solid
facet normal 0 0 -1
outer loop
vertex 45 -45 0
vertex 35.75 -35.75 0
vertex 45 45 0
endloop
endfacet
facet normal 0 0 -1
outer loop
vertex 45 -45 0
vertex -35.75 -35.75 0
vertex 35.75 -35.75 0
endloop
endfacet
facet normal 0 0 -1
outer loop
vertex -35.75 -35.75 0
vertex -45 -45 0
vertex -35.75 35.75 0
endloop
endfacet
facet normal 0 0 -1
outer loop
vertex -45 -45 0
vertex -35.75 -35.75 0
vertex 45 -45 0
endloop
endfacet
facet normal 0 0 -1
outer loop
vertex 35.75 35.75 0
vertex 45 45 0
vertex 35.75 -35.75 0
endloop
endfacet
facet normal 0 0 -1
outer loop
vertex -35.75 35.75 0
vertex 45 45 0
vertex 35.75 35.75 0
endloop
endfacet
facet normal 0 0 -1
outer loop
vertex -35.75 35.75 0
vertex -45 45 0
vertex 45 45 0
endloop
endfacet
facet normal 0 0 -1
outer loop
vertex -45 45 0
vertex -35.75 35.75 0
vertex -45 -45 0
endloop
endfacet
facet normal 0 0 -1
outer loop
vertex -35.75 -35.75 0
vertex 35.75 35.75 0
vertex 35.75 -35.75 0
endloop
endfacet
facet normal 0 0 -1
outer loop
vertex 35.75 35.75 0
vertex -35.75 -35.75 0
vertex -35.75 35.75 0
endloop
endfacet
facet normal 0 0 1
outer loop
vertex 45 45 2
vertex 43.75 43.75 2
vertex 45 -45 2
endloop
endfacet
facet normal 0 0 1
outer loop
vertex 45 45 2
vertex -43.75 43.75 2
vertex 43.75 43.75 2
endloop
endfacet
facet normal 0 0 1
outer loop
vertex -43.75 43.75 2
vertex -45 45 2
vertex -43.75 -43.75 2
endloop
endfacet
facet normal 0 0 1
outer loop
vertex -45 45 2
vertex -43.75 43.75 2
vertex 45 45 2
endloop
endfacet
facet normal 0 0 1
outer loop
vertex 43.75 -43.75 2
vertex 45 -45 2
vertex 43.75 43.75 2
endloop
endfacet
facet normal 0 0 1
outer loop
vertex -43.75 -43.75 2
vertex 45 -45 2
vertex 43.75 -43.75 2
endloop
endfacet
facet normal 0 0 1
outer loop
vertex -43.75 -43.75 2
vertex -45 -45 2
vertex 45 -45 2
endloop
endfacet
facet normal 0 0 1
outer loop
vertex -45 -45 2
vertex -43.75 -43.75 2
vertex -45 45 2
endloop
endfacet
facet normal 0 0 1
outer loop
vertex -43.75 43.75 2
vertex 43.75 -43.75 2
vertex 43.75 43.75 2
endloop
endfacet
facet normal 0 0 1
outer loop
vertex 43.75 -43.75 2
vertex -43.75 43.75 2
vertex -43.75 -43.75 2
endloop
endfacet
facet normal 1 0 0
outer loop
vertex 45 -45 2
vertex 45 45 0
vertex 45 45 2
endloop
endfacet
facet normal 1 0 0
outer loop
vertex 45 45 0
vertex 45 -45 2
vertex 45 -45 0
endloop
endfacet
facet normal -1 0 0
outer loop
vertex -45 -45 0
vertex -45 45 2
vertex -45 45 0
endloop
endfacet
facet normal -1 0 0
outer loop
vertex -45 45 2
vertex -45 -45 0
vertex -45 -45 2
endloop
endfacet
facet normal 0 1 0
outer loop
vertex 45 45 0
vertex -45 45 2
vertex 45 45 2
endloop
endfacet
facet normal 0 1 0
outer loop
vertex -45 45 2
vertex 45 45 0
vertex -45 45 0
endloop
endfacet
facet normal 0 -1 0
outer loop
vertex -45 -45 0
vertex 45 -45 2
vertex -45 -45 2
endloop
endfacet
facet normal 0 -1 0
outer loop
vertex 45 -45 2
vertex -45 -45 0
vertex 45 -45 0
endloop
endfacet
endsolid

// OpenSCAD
// Built by bench/smallmodels/features/compiler.py from a list of features.
$fn = 64;
difference() {
  union() {
    translate([0, 0, 0]) translate([-45, -45, 0]) cube([90, 90, 2]);
  }
  union() {
    translate([0, 0, -2]) rotate([0, 0, 0]) translate([-35.75, -35.75, 0]) cube([71.5, 71.5, 2]);
    translate([0, -135, 2]) rotate([0, 0, 0]) translate([-45, -1.25, 0]) cube([90, 2.5, 40]);
    translate([0, -45, 2]) rotate([0, 0, 0]) translate([-45, -1.25, 0]) cube([90, 2.5, 40]);
    translate([0, 45, 2]) rotate([0, 0, 0]) translate([-45, -1.25, 0]) cube([90, 2.5, 40]);
    translate([0, 135, 2]) rotate([0, 0, 0]) translate([-45, -1.25, 0]) cube([90, 2.5, 40]);
    translate([-135, 0, 2]) rotate([0, 0, 0]) translate([-1.25, -45, 0]) cube([2.5, 90, 40]);
    translate([-45, 0, 2]) rotate([0, 0, 0]) translate([-1.25, -45, 0]) cube([2.5, 90, 40]);
    translate([45, 0, 2]) rotate([0, 0, 0]) translate([-1.25, -45, 0]) cube([2.5, 90, 40]);
    translate([135, 0, 2]) rotate([0, 0, 0]) translate([-1.25, -45, 0]) cube([2.5, 90, 40]);
    translate([0, -135, 2]) rotate([0, 0, 0]) translate([-45, -1.25, 0]) cube([90, 2.5, 40]);
    translate([0, -45, 2]) rotate([0, 0, 0]) translate([-45, -1.25, 0]) cube([90, 2.5, 40]);
    translate([0, 45, 2]) rotate([0, 0, 0]) translate([-45, -1.25, 0]) cube([90, 2.5, 40]);
    translate([0, 135, 2]) rotate([0, 0, 0]) translate([-45, -1.25, 0]) cube([90, 2.5, 40]);
    translate([-135, 0, 2]) rotate([0, 0, 0]) translate([-1.25, -45, 0]) cube([2.5, 90, 40]);
    translate([-45, 0, 2]) rotate([0, 0, 0]) translate([-1.25, -45, 0]) cube([2.5, 90, 40]);
    translate([45, 0, 2]) rotate([0, 0, 0]) translate([-1.25, -45, 0]) cube([2.5, 90, 40]);
    translate([135, 0, 2]) rotate([0, 0, 0]) translate([-1.25, -45, 0]) cube([2.5, 90, 40]);
  }
}
